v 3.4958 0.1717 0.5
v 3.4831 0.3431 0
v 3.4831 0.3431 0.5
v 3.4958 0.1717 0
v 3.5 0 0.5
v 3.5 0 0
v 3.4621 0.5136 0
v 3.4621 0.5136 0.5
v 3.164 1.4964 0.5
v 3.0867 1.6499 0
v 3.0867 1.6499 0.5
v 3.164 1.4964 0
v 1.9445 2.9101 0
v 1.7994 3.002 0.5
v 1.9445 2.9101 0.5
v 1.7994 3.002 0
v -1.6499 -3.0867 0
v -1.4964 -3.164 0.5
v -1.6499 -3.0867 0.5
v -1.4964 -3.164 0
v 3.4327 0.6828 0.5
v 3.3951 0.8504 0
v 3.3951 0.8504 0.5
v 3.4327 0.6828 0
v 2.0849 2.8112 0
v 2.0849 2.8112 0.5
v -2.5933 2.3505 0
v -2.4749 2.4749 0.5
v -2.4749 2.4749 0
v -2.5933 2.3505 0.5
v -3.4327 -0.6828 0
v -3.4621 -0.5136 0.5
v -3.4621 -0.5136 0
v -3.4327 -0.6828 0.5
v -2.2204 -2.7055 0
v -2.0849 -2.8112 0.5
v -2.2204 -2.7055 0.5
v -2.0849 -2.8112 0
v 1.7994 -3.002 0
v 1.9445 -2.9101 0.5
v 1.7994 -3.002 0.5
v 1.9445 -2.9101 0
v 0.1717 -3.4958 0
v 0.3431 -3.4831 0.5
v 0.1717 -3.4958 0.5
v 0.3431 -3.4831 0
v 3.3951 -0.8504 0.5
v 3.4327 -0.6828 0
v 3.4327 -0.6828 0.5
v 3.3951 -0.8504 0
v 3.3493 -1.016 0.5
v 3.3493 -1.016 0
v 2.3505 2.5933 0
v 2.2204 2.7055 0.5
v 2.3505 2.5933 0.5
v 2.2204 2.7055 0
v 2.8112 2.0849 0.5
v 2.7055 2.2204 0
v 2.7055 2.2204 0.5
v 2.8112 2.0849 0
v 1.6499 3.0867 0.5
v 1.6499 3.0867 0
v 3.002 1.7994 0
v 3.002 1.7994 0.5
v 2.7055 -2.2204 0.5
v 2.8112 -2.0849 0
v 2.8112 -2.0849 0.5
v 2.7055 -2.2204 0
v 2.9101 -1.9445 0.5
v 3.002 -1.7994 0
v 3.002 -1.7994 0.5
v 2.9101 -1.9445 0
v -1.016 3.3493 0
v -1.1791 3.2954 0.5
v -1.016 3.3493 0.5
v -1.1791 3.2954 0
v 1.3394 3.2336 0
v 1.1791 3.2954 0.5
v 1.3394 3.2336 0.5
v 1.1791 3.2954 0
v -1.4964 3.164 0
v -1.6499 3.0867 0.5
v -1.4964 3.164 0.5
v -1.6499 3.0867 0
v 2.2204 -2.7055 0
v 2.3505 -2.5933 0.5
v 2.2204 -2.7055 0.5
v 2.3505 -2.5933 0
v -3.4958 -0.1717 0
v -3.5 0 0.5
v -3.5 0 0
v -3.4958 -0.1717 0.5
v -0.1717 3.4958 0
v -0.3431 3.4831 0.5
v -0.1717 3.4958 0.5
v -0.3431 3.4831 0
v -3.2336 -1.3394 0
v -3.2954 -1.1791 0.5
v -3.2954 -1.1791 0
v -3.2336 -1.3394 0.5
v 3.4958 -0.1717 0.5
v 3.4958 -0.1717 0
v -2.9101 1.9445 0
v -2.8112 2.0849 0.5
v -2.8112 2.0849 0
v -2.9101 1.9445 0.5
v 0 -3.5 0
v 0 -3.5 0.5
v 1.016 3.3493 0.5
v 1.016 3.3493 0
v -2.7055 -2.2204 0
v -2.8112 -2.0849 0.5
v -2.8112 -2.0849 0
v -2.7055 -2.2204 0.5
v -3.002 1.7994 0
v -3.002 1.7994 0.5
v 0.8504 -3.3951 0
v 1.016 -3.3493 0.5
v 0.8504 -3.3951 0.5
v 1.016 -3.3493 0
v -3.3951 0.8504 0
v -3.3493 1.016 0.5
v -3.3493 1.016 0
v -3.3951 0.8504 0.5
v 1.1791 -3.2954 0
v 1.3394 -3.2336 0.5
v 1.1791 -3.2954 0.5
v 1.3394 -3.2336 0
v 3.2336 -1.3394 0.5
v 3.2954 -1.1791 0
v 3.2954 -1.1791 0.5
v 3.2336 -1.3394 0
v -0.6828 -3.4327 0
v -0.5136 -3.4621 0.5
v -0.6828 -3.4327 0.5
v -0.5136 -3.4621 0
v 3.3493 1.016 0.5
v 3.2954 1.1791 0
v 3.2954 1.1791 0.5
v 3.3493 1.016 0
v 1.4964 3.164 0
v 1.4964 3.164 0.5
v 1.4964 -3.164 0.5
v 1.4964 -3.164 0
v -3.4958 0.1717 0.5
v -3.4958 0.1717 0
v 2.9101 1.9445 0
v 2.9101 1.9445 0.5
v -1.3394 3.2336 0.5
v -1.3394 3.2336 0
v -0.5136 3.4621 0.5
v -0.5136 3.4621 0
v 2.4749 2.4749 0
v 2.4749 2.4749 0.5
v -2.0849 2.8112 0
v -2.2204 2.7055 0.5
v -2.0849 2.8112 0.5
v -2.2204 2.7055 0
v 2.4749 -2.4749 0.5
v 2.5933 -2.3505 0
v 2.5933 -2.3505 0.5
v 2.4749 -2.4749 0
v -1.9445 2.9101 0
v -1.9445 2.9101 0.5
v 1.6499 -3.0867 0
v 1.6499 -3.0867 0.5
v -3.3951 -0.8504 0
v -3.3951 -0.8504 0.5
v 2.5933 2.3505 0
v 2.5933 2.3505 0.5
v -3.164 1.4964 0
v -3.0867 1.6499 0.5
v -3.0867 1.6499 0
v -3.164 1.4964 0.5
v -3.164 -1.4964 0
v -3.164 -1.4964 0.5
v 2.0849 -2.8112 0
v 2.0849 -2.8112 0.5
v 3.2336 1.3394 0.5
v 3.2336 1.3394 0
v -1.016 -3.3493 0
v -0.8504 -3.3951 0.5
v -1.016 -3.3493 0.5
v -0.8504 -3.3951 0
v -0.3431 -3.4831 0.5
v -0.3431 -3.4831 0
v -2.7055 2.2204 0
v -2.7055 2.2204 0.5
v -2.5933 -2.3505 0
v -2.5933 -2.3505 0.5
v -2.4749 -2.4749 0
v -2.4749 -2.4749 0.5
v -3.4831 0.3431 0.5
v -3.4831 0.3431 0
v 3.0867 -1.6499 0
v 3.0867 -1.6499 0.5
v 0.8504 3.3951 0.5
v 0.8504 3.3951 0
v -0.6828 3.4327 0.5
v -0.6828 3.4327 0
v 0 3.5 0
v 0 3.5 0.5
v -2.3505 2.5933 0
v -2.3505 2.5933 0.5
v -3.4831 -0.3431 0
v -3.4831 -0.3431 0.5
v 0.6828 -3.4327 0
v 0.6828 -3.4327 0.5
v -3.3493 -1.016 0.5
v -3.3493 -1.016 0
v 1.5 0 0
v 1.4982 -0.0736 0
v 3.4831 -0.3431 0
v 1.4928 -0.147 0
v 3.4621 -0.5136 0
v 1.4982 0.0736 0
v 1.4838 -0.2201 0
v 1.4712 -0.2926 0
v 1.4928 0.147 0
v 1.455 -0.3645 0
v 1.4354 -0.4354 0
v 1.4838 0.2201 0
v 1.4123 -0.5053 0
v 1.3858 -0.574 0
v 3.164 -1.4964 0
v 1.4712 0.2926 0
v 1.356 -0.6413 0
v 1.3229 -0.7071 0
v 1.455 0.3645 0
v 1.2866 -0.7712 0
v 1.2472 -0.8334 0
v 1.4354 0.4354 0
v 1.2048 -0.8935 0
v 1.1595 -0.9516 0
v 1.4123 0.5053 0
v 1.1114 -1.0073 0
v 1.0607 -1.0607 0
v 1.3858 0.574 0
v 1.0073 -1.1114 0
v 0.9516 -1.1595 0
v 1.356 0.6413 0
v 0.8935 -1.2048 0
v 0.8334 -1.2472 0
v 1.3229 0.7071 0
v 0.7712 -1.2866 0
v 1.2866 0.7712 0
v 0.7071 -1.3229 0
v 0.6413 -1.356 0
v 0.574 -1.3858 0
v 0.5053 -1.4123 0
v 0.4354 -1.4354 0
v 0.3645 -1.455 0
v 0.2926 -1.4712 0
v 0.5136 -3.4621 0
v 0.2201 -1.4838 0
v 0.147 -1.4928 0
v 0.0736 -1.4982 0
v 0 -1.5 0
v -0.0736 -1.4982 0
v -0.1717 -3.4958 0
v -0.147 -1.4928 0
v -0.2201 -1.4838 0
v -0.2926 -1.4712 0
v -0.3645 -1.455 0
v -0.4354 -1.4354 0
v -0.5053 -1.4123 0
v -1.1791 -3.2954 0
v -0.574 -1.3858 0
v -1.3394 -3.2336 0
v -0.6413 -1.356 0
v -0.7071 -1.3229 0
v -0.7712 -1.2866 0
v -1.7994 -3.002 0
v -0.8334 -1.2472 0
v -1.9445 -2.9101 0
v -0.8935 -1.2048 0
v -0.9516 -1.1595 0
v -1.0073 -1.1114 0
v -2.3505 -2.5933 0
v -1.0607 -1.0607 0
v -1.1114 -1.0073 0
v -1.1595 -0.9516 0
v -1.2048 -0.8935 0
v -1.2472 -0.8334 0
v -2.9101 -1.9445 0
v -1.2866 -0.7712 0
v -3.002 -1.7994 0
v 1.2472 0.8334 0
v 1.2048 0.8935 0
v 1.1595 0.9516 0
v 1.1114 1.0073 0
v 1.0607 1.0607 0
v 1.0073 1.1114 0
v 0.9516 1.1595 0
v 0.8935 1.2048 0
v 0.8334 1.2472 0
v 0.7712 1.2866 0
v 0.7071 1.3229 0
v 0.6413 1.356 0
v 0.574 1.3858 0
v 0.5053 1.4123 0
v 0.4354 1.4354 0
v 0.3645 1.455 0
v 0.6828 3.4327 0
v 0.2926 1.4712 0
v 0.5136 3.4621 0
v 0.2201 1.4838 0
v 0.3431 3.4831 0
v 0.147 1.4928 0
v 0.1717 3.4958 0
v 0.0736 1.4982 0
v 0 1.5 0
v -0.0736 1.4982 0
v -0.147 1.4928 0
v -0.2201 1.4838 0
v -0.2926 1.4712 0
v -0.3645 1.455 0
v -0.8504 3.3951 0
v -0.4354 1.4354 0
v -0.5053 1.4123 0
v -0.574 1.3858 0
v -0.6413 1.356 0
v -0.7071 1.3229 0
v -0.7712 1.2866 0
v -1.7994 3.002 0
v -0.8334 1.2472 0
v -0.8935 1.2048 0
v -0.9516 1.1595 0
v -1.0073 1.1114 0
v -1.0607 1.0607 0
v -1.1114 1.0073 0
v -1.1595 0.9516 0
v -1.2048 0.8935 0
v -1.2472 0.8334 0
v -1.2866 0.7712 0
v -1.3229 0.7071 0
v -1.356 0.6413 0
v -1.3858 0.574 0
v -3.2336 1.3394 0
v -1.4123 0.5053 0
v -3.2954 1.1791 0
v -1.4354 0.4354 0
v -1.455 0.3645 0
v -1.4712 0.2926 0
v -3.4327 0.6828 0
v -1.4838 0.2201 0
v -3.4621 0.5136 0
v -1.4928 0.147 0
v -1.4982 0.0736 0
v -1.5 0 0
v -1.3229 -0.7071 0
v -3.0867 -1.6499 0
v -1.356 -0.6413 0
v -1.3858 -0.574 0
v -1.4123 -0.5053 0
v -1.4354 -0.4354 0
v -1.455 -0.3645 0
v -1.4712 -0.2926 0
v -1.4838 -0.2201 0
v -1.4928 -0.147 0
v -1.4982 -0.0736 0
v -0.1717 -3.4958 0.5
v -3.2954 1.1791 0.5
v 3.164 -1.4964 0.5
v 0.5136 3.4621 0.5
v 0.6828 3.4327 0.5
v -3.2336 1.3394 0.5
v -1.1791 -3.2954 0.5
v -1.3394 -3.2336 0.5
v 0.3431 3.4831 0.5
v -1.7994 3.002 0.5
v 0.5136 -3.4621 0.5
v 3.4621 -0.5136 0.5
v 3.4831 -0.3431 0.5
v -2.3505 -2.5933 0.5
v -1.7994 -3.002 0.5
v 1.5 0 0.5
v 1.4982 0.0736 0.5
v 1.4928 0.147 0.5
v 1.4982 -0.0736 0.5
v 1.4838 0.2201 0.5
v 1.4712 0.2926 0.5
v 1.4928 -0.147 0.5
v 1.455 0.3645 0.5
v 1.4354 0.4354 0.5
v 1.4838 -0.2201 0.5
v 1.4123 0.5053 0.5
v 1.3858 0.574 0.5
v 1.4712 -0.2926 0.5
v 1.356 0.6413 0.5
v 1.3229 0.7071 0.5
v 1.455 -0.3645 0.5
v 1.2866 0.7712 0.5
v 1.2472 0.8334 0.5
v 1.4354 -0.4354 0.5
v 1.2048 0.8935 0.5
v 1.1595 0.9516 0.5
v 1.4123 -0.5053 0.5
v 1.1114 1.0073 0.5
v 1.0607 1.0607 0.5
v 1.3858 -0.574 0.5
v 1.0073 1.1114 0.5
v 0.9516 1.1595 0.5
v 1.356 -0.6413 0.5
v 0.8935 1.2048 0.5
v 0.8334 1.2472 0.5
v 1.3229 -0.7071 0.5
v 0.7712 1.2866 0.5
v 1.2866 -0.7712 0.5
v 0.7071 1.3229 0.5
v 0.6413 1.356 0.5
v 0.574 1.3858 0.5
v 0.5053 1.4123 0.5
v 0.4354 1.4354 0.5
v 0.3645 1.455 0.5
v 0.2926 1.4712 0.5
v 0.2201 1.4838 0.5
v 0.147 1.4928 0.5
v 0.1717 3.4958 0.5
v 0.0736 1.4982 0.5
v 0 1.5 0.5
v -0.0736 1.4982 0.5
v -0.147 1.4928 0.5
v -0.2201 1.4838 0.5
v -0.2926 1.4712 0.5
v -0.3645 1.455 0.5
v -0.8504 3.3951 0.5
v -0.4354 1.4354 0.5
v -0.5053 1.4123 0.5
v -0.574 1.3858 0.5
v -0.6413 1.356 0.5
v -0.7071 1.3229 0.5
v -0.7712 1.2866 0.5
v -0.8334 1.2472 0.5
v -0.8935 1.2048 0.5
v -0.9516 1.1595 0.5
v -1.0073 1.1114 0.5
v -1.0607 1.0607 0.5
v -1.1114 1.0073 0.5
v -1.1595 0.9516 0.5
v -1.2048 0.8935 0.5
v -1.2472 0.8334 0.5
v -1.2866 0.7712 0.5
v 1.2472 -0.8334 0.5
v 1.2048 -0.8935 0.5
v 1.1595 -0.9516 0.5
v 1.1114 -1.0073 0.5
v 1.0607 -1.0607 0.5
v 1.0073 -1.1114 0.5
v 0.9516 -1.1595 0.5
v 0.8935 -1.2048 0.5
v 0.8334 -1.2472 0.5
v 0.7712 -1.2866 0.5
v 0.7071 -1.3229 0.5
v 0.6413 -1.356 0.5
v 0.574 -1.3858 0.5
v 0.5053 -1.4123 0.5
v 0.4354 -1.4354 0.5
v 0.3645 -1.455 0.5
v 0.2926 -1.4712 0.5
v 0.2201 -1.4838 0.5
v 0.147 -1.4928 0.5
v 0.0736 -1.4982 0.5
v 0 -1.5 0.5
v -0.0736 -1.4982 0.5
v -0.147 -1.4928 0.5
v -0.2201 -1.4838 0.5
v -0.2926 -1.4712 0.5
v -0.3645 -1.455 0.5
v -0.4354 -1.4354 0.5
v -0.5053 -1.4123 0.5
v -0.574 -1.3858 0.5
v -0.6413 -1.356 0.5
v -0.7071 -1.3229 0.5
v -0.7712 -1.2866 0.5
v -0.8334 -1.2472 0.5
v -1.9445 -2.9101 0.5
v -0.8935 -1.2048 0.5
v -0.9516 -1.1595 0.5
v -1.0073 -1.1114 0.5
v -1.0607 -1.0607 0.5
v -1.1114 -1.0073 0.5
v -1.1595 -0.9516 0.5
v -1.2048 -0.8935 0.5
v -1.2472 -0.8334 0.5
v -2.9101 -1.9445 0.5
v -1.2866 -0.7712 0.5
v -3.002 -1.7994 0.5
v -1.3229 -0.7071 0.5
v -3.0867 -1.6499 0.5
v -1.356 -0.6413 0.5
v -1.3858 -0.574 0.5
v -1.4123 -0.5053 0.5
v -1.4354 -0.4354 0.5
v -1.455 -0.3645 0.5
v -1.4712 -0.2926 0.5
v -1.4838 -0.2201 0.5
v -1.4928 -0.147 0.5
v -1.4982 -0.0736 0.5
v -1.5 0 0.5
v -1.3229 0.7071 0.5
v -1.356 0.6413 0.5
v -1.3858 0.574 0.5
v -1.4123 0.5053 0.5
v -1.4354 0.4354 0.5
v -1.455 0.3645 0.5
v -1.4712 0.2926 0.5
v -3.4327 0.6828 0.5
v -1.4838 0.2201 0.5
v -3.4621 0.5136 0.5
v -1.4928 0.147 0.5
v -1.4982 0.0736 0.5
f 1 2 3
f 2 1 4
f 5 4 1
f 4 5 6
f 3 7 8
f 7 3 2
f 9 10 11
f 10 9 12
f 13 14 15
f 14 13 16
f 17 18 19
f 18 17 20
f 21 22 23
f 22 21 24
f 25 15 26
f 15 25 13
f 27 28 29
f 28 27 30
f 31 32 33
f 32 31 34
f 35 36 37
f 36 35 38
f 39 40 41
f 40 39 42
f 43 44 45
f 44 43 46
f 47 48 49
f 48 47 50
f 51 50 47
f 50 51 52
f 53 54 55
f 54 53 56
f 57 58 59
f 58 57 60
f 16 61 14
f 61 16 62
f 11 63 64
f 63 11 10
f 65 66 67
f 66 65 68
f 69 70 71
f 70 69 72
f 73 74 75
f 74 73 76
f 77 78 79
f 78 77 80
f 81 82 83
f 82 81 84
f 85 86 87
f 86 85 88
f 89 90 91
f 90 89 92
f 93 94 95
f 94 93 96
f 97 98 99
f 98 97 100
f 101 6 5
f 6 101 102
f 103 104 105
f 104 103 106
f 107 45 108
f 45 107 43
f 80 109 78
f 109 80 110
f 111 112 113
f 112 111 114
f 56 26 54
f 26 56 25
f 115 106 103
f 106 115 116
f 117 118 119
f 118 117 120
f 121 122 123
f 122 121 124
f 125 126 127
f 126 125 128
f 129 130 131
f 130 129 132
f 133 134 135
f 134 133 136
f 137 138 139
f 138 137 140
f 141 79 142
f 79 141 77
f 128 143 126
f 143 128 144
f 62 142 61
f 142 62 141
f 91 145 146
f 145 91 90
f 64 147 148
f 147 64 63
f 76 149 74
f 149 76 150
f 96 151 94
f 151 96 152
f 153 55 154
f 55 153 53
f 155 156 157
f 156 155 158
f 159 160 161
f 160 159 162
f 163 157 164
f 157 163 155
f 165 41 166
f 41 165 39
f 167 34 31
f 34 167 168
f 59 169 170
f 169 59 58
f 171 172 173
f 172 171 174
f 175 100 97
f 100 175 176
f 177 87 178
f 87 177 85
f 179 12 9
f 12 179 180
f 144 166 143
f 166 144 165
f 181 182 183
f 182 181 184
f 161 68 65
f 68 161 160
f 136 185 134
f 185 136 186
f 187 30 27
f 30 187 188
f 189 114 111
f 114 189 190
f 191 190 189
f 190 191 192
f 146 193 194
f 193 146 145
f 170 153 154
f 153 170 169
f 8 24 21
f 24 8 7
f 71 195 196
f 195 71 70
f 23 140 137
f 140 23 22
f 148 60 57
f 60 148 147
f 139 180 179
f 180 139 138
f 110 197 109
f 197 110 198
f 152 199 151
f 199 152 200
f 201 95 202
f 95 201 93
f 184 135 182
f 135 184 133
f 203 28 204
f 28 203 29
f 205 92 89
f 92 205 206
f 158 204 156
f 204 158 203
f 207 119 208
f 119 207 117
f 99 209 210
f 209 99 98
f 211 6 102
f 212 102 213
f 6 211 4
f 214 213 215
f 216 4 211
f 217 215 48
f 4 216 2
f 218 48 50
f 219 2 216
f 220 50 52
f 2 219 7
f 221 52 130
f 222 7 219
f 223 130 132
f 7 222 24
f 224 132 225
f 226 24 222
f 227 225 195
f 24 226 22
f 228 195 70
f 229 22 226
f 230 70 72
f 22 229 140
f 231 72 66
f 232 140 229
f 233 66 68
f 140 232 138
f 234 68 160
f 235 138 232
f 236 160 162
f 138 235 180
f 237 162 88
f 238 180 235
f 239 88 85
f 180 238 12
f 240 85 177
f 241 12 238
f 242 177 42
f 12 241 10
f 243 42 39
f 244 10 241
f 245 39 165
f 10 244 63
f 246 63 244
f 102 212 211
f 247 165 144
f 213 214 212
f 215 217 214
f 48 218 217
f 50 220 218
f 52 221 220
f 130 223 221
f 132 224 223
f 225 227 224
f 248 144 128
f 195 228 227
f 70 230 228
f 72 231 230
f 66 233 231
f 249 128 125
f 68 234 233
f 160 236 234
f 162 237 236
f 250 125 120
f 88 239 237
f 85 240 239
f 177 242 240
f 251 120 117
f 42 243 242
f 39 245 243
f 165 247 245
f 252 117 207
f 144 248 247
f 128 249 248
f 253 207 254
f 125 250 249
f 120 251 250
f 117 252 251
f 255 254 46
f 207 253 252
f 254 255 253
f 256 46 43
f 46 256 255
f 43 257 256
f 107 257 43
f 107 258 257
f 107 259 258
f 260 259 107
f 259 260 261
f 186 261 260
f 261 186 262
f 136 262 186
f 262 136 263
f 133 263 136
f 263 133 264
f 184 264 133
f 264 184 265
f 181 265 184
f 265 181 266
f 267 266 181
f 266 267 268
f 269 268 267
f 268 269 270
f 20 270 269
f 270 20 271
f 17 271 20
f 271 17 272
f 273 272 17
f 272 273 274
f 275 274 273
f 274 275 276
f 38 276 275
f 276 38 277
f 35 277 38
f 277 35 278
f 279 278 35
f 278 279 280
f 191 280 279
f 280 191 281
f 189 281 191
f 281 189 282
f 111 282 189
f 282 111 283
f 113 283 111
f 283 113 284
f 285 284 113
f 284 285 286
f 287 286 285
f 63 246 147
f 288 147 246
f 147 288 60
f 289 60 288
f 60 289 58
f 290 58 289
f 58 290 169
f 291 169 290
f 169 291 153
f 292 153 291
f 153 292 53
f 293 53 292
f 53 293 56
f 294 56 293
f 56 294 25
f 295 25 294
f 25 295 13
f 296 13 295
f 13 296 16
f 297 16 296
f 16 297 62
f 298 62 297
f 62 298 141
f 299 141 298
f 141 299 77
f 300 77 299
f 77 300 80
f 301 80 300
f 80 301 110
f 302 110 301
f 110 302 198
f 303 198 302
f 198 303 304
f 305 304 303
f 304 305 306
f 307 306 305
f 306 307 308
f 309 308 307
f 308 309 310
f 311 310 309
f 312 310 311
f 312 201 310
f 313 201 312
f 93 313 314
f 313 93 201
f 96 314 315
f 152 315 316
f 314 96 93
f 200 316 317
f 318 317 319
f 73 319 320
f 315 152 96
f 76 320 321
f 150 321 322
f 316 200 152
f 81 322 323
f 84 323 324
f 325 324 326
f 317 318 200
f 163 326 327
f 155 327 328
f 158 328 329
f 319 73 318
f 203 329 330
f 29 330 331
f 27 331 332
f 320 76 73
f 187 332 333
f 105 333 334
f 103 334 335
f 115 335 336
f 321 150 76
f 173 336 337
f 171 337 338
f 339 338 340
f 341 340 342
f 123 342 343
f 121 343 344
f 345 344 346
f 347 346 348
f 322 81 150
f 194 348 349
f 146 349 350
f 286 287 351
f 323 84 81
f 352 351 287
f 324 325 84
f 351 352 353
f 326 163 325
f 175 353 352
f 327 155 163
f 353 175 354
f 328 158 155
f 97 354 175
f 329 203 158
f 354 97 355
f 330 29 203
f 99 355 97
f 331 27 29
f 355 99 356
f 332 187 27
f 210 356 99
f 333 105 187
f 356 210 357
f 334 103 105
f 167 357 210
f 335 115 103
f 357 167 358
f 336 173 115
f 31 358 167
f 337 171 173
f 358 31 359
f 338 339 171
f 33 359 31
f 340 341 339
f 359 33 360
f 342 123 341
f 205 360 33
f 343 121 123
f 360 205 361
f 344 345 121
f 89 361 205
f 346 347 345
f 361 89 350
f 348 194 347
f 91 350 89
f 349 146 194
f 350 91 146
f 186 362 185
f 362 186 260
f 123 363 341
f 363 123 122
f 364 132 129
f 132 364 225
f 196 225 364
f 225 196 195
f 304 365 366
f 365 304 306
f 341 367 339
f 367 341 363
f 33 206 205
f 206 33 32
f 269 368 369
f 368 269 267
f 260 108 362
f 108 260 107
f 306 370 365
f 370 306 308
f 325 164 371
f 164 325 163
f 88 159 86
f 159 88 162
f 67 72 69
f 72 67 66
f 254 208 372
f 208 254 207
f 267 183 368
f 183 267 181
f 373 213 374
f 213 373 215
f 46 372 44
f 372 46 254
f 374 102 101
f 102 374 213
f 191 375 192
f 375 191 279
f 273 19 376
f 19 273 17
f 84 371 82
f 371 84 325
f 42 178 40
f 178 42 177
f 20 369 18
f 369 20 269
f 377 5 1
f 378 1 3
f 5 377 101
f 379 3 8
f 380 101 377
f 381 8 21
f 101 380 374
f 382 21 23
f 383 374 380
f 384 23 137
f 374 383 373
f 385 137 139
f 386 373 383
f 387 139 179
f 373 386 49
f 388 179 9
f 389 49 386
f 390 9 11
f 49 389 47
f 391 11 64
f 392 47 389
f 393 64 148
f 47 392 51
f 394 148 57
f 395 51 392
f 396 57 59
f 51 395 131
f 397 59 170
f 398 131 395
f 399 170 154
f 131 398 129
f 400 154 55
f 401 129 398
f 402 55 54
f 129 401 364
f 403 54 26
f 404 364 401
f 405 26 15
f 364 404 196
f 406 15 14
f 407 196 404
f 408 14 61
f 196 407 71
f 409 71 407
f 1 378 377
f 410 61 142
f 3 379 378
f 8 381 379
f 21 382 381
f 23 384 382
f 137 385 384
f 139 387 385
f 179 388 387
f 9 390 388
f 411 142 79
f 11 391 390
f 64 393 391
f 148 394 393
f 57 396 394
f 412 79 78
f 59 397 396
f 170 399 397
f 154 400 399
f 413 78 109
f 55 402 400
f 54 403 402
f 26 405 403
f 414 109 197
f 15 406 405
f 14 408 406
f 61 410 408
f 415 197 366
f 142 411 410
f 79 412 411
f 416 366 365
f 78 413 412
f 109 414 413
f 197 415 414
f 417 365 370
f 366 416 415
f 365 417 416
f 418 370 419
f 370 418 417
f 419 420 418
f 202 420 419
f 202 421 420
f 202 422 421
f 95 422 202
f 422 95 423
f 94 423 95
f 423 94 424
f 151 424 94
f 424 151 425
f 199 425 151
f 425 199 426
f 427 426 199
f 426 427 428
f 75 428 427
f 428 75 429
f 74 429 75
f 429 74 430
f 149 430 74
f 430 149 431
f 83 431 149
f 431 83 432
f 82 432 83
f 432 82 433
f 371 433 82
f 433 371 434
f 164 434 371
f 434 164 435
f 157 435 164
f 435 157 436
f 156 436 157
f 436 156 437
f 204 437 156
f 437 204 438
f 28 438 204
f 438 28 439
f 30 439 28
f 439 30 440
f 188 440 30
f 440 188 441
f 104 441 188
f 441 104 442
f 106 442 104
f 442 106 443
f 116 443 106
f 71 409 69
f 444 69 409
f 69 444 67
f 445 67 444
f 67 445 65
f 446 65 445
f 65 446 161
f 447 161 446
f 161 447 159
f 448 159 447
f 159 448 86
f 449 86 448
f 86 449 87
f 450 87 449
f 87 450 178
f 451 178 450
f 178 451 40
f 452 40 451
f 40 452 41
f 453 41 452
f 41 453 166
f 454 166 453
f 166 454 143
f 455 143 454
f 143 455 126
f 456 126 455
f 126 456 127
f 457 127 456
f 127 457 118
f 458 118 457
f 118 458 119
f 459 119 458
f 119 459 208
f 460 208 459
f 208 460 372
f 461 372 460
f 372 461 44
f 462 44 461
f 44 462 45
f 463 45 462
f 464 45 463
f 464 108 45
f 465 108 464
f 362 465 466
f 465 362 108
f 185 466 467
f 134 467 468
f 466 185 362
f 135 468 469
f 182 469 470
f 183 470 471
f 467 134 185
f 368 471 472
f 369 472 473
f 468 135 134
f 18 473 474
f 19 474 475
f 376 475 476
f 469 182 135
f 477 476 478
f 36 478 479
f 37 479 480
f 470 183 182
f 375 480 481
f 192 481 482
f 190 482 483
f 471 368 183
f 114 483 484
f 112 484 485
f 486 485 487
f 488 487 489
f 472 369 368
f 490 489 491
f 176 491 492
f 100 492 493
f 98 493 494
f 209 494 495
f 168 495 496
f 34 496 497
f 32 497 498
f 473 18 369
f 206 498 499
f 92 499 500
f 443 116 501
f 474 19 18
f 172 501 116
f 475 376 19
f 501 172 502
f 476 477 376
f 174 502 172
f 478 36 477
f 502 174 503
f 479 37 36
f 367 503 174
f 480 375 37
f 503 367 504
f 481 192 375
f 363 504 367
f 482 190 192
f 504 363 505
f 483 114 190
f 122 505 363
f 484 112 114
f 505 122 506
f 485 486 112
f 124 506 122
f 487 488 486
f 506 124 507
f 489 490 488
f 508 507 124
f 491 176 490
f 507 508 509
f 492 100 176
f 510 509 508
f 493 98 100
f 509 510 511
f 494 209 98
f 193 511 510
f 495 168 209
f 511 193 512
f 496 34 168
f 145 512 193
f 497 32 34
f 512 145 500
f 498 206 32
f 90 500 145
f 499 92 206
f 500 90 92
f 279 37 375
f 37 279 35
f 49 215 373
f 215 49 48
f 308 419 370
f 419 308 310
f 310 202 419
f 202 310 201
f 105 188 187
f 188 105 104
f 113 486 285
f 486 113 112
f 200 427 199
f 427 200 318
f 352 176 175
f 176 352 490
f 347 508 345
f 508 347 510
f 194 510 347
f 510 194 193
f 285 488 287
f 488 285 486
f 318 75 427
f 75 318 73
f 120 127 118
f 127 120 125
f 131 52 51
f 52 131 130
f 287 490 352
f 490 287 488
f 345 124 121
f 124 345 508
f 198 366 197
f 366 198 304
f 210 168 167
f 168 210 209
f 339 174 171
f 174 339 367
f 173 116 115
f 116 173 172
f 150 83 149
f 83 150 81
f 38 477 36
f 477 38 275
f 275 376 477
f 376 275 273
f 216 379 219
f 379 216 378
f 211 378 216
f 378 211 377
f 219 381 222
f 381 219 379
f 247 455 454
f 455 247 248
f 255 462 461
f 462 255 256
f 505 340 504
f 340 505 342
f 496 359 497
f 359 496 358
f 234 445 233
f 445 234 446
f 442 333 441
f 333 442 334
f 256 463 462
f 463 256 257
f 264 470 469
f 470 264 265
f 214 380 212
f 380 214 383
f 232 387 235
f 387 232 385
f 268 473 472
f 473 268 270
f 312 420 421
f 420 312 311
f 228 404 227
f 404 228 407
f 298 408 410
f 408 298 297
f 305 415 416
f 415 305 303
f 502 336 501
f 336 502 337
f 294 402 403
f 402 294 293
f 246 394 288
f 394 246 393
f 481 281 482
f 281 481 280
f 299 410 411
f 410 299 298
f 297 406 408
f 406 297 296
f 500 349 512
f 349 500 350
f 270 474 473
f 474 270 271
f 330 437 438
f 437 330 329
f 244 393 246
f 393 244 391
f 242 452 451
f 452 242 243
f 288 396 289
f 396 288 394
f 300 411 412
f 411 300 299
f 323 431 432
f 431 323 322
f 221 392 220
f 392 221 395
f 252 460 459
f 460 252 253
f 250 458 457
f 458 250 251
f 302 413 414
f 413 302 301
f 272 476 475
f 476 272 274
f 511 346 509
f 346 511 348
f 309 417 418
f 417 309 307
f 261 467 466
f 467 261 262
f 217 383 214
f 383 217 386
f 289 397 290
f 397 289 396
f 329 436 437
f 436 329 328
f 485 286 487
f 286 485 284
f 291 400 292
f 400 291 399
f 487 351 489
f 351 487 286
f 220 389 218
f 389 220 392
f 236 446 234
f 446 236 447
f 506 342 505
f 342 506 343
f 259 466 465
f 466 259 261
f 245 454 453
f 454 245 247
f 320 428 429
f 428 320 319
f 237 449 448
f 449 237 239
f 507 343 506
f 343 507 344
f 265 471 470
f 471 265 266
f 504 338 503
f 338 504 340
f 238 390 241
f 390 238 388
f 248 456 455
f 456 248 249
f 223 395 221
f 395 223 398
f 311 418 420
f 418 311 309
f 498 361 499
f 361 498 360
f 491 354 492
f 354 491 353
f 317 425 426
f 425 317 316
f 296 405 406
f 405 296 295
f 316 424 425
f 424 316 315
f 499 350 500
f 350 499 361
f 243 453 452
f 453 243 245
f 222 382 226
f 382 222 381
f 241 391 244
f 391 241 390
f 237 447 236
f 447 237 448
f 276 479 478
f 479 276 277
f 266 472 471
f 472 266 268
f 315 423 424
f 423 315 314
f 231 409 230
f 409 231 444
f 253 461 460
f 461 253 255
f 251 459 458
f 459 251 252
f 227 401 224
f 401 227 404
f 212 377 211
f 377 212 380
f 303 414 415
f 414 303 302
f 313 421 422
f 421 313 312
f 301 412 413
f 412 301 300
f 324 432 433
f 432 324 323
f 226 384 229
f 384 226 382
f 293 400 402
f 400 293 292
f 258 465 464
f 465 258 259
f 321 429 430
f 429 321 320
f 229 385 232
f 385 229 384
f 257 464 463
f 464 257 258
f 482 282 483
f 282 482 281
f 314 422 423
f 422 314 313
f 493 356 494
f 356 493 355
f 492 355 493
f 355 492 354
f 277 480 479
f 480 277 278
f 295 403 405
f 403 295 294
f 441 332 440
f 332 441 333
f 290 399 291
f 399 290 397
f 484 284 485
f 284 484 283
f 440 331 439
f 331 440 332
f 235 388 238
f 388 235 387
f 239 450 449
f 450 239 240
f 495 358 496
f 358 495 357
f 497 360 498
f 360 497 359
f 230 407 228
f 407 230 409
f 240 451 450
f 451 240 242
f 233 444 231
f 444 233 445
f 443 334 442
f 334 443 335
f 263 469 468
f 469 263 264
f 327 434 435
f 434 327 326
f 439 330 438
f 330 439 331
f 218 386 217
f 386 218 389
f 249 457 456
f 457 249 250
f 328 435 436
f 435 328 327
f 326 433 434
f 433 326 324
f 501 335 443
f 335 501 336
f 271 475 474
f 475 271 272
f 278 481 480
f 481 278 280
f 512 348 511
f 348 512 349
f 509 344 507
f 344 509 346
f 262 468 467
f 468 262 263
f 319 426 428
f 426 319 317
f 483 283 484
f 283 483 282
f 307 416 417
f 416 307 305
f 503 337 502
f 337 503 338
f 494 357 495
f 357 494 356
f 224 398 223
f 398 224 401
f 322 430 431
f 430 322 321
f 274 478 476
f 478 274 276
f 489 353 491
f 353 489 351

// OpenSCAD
$fn = 128;

inner_d = 3.0;
outer_d = 7.0;
thickness = 0.5;

difference() {
  cylinder(d = outer_d, h = thickness);
  cylinder(d = inner_d, h = thickness + 0.2);
}
